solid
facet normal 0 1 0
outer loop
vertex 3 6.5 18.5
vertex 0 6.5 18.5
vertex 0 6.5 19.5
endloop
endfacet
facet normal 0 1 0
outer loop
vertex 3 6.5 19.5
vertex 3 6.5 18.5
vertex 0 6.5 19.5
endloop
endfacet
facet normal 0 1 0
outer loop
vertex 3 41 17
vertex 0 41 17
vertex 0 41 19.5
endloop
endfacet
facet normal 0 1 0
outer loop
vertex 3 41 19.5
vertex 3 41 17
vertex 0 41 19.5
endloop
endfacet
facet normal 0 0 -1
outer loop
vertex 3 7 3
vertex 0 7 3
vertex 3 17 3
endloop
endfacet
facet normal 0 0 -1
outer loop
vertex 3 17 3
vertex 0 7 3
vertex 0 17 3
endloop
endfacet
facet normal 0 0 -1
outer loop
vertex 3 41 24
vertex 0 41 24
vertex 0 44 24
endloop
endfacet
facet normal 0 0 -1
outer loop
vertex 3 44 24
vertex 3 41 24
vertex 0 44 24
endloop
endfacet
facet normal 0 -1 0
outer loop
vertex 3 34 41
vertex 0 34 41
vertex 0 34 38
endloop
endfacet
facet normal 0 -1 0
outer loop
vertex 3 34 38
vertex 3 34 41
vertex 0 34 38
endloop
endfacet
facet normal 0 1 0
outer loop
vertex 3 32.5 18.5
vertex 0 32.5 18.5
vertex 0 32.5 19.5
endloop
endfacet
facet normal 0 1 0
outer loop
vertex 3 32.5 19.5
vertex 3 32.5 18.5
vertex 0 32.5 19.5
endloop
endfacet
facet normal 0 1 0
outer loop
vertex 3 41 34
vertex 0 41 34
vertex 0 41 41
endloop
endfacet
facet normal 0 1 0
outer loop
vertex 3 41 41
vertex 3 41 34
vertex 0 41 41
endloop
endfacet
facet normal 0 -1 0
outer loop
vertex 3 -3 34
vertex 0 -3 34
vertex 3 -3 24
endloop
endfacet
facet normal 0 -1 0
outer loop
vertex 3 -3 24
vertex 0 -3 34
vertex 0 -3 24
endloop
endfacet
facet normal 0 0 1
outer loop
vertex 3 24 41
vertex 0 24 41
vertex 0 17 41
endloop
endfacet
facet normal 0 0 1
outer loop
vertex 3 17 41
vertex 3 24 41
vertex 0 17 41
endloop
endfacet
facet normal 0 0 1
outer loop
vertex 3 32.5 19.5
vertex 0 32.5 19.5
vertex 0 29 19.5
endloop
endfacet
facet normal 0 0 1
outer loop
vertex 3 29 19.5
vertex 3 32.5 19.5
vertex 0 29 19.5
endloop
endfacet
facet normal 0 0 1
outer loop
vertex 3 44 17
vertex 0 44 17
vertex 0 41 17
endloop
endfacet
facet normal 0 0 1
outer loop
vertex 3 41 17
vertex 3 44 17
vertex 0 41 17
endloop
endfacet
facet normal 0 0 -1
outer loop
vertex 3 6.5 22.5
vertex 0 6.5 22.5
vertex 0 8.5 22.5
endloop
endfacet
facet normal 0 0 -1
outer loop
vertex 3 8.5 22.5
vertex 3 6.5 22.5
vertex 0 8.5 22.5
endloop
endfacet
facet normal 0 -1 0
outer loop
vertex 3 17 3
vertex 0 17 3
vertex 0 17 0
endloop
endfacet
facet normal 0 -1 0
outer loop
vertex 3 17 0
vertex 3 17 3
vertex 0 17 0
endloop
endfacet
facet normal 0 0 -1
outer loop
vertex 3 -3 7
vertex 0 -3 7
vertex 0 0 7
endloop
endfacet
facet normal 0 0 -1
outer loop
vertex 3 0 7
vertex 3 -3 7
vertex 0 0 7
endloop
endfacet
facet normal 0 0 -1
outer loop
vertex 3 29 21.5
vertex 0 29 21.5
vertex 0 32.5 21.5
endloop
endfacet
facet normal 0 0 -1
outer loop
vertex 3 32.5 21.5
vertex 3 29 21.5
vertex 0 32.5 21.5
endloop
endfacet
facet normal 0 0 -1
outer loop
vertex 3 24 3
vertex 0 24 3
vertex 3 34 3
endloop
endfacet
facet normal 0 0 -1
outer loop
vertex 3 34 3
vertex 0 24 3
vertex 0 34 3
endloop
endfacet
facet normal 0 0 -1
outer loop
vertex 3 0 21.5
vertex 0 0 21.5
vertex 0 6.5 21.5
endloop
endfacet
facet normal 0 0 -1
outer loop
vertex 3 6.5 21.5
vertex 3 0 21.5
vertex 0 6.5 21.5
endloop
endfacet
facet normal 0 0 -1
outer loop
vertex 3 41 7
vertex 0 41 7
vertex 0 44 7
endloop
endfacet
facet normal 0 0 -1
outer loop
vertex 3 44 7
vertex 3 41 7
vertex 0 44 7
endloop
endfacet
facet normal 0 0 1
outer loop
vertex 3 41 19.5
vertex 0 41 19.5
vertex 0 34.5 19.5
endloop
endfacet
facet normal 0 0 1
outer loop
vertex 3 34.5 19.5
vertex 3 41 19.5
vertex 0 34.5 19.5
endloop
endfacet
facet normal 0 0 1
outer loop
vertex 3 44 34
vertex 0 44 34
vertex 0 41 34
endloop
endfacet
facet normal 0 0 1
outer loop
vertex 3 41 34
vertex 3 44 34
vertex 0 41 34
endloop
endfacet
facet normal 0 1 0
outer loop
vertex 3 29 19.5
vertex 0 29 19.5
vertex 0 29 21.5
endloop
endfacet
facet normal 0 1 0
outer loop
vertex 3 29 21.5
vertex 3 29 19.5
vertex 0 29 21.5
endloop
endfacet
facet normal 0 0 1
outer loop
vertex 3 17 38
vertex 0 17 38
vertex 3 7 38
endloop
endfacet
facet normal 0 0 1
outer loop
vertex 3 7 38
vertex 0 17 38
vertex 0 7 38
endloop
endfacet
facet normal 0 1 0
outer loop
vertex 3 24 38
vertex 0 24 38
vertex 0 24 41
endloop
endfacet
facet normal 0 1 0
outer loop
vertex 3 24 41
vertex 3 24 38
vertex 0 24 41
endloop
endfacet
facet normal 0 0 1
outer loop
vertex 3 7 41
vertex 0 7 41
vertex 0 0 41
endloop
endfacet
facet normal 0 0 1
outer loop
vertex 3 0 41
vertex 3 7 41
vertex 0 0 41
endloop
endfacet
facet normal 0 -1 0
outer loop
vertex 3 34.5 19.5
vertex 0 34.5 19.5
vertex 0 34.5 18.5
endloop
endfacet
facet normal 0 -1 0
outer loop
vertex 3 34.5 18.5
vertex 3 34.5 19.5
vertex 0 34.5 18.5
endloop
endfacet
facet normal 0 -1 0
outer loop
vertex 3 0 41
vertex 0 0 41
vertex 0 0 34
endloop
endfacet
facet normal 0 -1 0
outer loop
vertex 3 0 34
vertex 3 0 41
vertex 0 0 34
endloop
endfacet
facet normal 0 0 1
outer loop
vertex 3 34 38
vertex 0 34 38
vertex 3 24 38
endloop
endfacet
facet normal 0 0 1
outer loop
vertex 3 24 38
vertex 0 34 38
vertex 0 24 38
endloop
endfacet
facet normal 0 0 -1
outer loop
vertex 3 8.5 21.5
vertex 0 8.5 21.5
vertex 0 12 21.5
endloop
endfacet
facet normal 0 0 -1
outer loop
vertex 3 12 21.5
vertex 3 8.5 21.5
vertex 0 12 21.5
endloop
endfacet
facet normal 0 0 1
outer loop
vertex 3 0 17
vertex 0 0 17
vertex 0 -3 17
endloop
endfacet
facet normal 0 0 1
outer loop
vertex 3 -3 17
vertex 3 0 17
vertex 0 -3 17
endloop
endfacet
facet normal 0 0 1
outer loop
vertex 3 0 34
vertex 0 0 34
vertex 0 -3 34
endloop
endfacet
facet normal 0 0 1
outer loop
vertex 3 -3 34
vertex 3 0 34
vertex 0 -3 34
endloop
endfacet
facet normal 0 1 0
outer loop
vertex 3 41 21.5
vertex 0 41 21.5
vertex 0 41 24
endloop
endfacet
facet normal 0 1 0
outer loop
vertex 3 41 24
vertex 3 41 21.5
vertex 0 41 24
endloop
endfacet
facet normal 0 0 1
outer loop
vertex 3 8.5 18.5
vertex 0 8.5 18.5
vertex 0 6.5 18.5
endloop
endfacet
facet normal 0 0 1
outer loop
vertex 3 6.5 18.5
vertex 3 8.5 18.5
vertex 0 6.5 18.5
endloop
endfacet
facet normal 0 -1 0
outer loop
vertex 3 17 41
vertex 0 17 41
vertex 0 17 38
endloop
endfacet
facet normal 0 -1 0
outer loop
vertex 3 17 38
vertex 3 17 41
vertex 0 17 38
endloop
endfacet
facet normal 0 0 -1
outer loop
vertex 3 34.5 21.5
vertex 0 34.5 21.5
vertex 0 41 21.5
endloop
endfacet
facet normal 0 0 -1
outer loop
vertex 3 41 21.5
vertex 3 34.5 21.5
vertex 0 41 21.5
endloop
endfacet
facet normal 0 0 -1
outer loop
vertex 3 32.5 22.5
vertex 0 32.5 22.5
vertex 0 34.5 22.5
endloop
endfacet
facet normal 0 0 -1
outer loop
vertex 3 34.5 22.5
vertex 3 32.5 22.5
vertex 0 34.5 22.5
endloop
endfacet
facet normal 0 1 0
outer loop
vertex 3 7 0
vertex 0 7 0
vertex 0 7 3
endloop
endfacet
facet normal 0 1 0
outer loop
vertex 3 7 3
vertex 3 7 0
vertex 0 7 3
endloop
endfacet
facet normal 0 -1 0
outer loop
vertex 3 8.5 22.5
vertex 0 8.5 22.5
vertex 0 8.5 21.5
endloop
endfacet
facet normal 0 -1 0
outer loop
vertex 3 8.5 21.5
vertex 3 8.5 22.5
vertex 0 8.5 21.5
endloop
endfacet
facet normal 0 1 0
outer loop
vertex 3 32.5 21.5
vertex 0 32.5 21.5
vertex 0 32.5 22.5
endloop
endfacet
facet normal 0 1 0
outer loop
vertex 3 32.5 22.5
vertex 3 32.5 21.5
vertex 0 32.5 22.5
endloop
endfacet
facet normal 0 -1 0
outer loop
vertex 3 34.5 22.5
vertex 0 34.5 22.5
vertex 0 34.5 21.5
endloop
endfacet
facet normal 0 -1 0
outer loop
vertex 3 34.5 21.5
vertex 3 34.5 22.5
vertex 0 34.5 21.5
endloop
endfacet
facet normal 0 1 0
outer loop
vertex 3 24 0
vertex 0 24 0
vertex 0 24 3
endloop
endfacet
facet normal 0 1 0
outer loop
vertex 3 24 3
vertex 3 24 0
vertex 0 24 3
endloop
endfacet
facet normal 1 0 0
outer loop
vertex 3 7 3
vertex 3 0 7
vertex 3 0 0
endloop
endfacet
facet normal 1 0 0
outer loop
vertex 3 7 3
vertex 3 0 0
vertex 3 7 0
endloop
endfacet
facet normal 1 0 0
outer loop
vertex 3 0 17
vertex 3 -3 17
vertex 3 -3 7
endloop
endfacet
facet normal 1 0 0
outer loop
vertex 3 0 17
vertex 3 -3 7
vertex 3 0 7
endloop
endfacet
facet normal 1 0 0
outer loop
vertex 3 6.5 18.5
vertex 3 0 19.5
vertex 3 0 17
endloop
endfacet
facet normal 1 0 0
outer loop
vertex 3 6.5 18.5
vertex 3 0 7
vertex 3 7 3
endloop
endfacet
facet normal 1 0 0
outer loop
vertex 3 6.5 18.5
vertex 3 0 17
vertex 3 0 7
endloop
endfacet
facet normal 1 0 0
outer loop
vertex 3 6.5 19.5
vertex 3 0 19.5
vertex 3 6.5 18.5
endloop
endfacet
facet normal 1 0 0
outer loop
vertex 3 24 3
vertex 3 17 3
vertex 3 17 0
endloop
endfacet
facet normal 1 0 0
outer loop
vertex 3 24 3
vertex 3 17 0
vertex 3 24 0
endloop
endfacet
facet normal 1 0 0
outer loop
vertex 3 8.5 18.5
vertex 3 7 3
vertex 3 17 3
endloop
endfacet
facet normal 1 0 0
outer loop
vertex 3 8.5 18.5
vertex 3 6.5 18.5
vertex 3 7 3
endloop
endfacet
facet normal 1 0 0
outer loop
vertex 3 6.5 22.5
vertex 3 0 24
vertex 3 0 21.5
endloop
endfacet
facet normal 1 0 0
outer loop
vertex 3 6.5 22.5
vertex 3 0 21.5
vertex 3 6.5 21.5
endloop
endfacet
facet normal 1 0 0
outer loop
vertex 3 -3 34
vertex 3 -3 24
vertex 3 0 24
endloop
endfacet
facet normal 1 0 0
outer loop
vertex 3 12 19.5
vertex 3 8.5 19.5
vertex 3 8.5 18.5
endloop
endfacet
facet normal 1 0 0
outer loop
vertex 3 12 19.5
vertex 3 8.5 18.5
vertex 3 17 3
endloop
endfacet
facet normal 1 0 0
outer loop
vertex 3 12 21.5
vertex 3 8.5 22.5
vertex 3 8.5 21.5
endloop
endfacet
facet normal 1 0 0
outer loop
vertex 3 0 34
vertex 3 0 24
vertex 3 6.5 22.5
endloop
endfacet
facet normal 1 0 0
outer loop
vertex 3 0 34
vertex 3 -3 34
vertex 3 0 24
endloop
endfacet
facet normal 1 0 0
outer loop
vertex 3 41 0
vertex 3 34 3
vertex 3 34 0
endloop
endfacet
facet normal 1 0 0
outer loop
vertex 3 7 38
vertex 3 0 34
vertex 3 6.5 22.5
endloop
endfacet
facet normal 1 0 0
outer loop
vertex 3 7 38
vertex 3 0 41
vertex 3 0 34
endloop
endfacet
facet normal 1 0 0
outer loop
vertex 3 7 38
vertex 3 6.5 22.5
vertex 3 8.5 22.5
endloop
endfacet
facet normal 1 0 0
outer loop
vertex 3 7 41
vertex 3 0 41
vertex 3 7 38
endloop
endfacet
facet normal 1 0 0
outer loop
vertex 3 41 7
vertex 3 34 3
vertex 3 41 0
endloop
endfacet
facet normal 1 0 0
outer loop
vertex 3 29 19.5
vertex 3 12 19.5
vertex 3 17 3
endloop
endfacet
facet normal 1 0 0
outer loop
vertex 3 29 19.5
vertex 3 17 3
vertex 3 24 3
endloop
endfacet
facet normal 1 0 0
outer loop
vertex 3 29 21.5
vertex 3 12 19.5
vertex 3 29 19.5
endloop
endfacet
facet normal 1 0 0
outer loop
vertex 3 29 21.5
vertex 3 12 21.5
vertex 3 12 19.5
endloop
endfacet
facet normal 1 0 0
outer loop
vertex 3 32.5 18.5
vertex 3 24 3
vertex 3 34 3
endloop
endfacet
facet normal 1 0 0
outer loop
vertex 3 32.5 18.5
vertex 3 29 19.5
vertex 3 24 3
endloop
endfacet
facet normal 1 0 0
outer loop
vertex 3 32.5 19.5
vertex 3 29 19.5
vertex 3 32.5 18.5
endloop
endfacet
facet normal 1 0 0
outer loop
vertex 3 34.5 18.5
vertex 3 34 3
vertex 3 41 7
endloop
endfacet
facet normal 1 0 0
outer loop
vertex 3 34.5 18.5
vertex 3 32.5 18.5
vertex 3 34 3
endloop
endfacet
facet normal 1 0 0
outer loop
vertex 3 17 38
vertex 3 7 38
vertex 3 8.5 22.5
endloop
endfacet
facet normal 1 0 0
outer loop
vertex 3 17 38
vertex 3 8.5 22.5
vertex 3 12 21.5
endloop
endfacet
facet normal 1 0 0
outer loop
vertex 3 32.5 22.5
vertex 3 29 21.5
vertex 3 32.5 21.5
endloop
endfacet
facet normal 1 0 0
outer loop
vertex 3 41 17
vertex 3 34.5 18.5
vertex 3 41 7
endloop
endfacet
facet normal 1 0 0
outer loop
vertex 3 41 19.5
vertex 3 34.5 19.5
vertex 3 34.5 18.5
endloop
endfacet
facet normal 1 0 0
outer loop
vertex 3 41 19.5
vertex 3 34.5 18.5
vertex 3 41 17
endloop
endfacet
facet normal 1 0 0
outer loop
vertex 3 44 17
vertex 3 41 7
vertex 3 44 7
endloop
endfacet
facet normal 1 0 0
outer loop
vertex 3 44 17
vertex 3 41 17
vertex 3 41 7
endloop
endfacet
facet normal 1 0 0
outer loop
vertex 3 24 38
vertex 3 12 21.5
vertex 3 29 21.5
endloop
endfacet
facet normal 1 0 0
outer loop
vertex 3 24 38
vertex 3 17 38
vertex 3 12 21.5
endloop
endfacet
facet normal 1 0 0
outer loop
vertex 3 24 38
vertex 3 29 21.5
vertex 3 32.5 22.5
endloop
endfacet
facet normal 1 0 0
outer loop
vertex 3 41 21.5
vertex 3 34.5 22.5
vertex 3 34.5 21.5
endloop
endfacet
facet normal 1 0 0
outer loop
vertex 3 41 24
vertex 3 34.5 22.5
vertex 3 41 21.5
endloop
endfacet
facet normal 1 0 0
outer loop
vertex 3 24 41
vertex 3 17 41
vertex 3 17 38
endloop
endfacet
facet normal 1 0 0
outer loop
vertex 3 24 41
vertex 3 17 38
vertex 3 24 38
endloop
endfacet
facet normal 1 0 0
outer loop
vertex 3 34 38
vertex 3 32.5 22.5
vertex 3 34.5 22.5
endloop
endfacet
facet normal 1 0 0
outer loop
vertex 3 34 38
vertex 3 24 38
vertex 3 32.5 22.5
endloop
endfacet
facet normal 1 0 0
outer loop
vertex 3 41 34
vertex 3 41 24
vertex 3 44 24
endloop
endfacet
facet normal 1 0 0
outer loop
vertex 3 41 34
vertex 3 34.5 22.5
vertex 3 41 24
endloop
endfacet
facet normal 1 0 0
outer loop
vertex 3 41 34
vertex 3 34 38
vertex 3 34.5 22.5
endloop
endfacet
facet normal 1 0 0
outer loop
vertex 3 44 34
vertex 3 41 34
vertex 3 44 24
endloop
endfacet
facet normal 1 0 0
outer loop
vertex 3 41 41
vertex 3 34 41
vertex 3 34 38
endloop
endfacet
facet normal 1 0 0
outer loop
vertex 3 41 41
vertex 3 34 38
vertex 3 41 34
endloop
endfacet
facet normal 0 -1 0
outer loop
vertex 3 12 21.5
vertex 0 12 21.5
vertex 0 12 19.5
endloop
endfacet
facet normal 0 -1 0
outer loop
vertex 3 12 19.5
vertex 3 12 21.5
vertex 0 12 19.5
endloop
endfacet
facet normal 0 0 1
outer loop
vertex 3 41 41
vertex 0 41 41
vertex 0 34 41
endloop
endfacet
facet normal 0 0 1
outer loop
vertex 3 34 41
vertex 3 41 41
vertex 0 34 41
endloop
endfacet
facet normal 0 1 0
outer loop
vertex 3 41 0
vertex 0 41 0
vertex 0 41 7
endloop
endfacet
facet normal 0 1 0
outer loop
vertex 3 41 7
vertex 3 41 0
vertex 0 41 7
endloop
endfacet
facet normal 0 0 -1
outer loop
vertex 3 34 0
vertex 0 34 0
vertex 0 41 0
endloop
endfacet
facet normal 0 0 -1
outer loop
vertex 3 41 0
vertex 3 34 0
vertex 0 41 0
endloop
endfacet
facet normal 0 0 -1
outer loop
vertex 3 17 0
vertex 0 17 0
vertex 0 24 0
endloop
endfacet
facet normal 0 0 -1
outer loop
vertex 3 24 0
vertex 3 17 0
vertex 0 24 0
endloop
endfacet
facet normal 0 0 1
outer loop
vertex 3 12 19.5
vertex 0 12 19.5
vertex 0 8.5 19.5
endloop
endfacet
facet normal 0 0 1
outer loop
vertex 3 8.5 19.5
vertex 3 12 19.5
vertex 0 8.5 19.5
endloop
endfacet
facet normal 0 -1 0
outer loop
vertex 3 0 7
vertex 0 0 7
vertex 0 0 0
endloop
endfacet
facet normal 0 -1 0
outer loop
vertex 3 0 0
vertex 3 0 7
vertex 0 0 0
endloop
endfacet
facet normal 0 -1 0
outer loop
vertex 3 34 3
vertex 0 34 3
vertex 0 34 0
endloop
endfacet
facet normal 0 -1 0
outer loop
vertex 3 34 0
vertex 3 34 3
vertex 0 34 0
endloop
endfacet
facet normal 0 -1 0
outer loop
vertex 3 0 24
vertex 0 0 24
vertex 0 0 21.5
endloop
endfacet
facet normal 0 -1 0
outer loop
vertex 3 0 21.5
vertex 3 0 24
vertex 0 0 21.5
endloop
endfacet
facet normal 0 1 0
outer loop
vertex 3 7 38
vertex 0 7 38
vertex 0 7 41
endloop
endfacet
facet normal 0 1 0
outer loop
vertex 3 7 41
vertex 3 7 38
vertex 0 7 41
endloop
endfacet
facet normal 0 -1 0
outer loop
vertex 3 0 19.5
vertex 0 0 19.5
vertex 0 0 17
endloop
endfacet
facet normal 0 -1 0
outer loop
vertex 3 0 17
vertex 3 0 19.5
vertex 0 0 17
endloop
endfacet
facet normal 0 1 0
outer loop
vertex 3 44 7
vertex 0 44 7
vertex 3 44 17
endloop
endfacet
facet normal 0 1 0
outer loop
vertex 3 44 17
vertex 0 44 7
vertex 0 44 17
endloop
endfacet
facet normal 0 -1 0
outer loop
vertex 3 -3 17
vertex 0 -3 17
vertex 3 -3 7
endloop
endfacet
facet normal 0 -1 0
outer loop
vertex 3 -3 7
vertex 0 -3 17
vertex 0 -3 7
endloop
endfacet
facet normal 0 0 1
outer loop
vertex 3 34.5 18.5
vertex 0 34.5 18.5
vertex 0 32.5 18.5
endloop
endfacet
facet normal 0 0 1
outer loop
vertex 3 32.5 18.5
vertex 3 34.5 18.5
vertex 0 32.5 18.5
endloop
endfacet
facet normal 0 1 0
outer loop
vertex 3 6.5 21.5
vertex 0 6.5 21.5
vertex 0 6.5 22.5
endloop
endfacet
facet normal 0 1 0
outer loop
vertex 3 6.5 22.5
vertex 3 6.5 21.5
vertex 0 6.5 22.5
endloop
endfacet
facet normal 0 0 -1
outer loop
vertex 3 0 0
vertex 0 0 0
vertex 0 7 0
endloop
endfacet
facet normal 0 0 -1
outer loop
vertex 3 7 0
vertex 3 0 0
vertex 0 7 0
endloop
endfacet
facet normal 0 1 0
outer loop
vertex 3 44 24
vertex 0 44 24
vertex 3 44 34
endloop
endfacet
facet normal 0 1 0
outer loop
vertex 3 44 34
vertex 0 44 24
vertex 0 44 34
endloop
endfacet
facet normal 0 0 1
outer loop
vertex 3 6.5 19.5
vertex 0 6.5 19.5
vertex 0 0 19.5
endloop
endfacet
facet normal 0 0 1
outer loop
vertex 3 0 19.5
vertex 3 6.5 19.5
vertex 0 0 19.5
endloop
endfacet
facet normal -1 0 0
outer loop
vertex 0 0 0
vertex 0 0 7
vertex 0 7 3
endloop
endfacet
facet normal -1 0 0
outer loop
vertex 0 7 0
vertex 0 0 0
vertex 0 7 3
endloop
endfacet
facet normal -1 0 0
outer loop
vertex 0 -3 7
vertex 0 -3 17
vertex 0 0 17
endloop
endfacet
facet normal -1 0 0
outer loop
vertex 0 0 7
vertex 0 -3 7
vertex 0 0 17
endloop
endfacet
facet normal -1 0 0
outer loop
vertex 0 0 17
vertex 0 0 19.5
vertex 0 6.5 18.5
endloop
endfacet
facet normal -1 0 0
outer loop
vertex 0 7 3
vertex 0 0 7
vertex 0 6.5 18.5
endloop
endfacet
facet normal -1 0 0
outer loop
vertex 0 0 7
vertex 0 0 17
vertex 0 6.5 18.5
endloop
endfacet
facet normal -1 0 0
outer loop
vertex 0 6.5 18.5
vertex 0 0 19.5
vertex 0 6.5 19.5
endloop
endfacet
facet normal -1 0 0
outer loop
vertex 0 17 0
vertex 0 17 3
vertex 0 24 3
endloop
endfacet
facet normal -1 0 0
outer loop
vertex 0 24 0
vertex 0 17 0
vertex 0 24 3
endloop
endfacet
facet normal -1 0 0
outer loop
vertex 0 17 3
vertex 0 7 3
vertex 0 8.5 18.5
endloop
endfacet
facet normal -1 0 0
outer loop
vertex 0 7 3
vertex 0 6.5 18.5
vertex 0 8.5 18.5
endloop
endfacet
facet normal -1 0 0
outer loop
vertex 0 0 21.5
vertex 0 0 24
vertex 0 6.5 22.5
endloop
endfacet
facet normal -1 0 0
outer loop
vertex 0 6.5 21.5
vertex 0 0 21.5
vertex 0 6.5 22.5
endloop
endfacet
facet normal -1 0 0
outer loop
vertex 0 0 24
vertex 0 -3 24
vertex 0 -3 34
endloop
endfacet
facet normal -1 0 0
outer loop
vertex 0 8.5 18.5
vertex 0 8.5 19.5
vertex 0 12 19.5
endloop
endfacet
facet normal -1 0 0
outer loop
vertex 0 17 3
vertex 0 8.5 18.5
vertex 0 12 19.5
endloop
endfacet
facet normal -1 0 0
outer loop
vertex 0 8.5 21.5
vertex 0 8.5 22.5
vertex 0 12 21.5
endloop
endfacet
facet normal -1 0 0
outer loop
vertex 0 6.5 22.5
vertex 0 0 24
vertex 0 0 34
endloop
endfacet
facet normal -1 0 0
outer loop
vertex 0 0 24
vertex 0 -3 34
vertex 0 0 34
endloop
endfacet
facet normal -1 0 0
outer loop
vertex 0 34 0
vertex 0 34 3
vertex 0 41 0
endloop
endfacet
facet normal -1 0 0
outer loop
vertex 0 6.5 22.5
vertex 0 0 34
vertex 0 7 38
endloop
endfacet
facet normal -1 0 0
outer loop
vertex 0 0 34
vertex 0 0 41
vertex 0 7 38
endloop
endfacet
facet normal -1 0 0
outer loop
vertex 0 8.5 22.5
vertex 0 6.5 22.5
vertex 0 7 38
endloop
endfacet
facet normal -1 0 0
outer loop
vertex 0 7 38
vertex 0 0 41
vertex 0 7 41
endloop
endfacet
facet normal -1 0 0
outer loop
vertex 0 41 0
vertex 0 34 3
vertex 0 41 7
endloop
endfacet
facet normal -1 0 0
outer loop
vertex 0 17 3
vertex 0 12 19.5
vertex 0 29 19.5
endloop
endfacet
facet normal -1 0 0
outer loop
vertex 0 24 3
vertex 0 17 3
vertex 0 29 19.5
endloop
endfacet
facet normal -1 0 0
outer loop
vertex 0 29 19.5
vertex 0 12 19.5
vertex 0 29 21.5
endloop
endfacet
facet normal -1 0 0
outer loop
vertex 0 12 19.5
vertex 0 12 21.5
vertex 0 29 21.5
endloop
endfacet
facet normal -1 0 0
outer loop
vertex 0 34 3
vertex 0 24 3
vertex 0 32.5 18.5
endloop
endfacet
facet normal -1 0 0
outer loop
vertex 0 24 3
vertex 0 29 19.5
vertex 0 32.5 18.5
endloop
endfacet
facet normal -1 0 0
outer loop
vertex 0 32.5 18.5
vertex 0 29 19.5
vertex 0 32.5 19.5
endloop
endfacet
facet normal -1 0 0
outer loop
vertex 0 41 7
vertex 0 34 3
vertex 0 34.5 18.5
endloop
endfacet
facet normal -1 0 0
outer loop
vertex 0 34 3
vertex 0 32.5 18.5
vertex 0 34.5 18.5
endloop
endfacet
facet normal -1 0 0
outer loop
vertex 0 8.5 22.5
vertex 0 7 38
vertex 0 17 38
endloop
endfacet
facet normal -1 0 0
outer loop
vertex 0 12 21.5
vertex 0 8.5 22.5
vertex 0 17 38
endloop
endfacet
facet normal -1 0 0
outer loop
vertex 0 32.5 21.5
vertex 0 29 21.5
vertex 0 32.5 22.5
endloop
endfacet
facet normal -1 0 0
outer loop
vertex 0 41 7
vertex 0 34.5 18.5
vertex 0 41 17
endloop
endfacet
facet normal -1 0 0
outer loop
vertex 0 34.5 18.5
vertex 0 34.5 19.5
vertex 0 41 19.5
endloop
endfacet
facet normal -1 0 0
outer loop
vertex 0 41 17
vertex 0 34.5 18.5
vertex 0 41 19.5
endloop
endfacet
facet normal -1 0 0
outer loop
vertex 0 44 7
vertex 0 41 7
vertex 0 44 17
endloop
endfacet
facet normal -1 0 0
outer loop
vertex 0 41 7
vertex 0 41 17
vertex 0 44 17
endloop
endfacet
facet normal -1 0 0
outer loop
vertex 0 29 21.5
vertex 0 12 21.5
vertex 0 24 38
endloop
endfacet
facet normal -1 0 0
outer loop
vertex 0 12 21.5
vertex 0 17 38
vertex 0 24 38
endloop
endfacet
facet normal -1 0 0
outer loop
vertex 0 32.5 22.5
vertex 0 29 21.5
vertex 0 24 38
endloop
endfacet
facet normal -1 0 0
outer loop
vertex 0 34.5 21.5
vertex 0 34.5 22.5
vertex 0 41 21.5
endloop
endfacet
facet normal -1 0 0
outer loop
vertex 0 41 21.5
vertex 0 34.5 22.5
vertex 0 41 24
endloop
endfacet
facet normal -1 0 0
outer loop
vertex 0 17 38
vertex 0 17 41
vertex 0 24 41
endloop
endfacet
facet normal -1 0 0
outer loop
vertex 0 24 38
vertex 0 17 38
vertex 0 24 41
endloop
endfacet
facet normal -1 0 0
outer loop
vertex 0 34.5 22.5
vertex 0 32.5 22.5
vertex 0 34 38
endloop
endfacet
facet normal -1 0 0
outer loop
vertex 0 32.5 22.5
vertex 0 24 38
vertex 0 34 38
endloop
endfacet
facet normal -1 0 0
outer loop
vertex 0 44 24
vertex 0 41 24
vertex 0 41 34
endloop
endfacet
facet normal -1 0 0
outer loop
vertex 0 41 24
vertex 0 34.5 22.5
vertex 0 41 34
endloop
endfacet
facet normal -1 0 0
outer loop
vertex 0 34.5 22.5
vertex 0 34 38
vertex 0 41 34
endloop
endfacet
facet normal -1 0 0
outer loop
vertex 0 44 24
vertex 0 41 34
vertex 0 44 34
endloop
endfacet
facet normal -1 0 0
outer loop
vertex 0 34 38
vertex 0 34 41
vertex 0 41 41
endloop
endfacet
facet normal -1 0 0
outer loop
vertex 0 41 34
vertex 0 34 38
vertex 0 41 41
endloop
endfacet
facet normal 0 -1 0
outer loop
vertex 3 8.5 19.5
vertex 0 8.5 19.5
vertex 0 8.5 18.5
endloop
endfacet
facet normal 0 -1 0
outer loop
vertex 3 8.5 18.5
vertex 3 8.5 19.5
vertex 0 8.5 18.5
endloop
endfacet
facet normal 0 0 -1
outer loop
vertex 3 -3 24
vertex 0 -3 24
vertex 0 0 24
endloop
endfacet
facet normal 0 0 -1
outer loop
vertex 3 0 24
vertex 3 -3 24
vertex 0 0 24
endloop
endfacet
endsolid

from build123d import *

# Parameters (mm, degrees)
F1_DEPTH = 3


with BuildPart() as f1:
    # F0 (on Right) → F1 (new body)
    with BuildSketch(Plane.YZ):
        Polygon((20.5, 0), (24, 0), (24, 3), (34, 3), (34, 0), (41, 0), (41, 7), (44, 7), (44, 17), (41, 17), (41, 19.5), (34.5, 19.5), (34.5, 18.5), (32.5, 18.5), (32.5, 19.5), (29, 19.5), (29, 20.5), (29, 21.5), (32.5, 21.5), (32.5, 22.5), (34.5, 22.5), (34.5, 21.5), (41, 21.5), (41, 24), (44, 24), (44, 34), (41, 34), (41, 41), (34, 41), (34, 38), (24, 38), (24, 41), (20.5, 41), (17, 41), (17, 38), (7, 38), (7, 41), (0, 41), (0, 34), (-3, 34), (-3, 24), (0, 24), (0, 21.5), (6.5, 21.5), (6.5, 22.5), (8.5, 22.5), (8.5, 21.5), (12, 21.5), (12, 20.5), (12, 19.5), (8.5, 19.5), (8.5, 18.5), (6.5, 18.5), (6.5, 19.5), (0, 19.5), (0, 17), (-3, 17), (-3, 7), (0, 7), (0, 0), (7, 0), (7, 3), (17, 3), (17, 0), align=None)
    extrude(amount=F1_DEPTH)


solid = f1.part
